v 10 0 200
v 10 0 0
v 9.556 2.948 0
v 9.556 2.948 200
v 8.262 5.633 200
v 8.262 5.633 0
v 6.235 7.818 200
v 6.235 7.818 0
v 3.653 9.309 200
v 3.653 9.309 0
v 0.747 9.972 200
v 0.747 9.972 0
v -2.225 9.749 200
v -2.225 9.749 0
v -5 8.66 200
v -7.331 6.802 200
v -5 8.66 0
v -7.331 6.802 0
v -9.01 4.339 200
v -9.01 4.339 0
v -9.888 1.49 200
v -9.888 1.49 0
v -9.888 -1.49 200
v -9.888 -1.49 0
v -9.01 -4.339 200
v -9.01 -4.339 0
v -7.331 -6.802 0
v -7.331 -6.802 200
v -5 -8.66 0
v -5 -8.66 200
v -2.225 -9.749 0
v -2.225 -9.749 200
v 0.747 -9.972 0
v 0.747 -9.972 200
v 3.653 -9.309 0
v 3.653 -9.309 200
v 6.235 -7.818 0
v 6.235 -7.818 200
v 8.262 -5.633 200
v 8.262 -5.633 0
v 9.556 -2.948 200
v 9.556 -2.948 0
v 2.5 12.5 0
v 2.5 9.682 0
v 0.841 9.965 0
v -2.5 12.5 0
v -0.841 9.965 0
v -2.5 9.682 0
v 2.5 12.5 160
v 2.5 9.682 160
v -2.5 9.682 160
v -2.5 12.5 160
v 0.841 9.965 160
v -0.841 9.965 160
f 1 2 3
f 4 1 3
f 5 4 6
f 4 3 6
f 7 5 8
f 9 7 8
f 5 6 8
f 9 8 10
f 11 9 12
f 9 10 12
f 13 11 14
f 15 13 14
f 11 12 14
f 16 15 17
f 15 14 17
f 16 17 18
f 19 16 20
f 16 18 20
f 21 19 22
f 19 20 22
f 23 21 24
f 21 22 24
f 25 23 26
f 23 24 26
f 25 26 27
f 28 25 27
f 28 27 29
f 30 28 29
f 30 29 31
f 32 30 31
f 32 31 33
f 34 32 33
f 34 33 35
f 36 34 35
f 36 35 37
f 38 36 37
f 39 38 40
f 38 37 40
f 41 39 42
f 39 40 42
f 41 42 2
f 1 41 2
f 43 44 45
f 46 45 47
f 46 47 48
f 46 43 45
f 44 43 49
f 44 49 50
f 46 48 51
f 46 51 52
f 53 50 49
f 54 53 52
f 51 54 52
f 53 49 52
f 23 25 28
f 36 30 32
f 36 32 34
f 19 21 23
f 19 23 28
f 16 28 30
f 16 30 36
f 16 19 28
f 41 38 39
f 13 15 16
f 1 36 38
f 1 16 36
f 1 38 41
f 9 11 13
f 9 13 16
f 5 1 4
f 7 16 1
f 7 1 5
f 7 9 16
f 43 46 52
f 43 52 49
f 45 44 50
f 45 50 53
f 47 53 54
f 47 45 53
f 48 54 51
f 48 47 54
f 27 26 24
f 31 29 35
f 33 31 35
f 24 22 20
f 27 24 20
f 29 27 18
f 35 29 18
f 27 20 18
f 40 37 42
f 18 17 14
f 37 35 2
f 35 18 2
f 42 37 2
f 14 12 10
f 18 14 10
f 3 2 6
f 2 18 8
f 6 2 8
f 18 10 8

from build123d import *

# Parameters (mm, degrees)
SKETCH1_R           = 10
BOSS_EXTRUDE1_DEPTH = 200
BOSS_EXTRUDE2_DEPTH = 160


with BuildPart() as part:
    # Sketch1 → Boss-Extrude1 (new body)
    with BuildSketch(Plane.XY):
        Circle(SKETCH1_R)
    extrude(amount=BOSS_EXTRUDE1_DEPTH)


with BuildPart() as body_2:
    # Sketch2 → Boss-Extrude2 (new body)
    with BuildSketch(Plane(origin=(0, 0, 0), x_dir=(-1, 0, 0), z_dir=(0, 0, -1))):
        with BuildLine():
            Line((2.5, 12.5), (-2.5, 12.5))
            Line((-2.5, 12.5), (-2.5, 9.682458366))
            ThreePointArc((-2.5, 9.682458366), (0, 10), (2.5, 9.682458366))
            Line((2.5, 9.682458366), (2.5, 12.5))
        make_face()
    extrude(amount=-BOSS_EXTRUDE2_DEPTH)


solid = Compound([part.part, body_2.part])
